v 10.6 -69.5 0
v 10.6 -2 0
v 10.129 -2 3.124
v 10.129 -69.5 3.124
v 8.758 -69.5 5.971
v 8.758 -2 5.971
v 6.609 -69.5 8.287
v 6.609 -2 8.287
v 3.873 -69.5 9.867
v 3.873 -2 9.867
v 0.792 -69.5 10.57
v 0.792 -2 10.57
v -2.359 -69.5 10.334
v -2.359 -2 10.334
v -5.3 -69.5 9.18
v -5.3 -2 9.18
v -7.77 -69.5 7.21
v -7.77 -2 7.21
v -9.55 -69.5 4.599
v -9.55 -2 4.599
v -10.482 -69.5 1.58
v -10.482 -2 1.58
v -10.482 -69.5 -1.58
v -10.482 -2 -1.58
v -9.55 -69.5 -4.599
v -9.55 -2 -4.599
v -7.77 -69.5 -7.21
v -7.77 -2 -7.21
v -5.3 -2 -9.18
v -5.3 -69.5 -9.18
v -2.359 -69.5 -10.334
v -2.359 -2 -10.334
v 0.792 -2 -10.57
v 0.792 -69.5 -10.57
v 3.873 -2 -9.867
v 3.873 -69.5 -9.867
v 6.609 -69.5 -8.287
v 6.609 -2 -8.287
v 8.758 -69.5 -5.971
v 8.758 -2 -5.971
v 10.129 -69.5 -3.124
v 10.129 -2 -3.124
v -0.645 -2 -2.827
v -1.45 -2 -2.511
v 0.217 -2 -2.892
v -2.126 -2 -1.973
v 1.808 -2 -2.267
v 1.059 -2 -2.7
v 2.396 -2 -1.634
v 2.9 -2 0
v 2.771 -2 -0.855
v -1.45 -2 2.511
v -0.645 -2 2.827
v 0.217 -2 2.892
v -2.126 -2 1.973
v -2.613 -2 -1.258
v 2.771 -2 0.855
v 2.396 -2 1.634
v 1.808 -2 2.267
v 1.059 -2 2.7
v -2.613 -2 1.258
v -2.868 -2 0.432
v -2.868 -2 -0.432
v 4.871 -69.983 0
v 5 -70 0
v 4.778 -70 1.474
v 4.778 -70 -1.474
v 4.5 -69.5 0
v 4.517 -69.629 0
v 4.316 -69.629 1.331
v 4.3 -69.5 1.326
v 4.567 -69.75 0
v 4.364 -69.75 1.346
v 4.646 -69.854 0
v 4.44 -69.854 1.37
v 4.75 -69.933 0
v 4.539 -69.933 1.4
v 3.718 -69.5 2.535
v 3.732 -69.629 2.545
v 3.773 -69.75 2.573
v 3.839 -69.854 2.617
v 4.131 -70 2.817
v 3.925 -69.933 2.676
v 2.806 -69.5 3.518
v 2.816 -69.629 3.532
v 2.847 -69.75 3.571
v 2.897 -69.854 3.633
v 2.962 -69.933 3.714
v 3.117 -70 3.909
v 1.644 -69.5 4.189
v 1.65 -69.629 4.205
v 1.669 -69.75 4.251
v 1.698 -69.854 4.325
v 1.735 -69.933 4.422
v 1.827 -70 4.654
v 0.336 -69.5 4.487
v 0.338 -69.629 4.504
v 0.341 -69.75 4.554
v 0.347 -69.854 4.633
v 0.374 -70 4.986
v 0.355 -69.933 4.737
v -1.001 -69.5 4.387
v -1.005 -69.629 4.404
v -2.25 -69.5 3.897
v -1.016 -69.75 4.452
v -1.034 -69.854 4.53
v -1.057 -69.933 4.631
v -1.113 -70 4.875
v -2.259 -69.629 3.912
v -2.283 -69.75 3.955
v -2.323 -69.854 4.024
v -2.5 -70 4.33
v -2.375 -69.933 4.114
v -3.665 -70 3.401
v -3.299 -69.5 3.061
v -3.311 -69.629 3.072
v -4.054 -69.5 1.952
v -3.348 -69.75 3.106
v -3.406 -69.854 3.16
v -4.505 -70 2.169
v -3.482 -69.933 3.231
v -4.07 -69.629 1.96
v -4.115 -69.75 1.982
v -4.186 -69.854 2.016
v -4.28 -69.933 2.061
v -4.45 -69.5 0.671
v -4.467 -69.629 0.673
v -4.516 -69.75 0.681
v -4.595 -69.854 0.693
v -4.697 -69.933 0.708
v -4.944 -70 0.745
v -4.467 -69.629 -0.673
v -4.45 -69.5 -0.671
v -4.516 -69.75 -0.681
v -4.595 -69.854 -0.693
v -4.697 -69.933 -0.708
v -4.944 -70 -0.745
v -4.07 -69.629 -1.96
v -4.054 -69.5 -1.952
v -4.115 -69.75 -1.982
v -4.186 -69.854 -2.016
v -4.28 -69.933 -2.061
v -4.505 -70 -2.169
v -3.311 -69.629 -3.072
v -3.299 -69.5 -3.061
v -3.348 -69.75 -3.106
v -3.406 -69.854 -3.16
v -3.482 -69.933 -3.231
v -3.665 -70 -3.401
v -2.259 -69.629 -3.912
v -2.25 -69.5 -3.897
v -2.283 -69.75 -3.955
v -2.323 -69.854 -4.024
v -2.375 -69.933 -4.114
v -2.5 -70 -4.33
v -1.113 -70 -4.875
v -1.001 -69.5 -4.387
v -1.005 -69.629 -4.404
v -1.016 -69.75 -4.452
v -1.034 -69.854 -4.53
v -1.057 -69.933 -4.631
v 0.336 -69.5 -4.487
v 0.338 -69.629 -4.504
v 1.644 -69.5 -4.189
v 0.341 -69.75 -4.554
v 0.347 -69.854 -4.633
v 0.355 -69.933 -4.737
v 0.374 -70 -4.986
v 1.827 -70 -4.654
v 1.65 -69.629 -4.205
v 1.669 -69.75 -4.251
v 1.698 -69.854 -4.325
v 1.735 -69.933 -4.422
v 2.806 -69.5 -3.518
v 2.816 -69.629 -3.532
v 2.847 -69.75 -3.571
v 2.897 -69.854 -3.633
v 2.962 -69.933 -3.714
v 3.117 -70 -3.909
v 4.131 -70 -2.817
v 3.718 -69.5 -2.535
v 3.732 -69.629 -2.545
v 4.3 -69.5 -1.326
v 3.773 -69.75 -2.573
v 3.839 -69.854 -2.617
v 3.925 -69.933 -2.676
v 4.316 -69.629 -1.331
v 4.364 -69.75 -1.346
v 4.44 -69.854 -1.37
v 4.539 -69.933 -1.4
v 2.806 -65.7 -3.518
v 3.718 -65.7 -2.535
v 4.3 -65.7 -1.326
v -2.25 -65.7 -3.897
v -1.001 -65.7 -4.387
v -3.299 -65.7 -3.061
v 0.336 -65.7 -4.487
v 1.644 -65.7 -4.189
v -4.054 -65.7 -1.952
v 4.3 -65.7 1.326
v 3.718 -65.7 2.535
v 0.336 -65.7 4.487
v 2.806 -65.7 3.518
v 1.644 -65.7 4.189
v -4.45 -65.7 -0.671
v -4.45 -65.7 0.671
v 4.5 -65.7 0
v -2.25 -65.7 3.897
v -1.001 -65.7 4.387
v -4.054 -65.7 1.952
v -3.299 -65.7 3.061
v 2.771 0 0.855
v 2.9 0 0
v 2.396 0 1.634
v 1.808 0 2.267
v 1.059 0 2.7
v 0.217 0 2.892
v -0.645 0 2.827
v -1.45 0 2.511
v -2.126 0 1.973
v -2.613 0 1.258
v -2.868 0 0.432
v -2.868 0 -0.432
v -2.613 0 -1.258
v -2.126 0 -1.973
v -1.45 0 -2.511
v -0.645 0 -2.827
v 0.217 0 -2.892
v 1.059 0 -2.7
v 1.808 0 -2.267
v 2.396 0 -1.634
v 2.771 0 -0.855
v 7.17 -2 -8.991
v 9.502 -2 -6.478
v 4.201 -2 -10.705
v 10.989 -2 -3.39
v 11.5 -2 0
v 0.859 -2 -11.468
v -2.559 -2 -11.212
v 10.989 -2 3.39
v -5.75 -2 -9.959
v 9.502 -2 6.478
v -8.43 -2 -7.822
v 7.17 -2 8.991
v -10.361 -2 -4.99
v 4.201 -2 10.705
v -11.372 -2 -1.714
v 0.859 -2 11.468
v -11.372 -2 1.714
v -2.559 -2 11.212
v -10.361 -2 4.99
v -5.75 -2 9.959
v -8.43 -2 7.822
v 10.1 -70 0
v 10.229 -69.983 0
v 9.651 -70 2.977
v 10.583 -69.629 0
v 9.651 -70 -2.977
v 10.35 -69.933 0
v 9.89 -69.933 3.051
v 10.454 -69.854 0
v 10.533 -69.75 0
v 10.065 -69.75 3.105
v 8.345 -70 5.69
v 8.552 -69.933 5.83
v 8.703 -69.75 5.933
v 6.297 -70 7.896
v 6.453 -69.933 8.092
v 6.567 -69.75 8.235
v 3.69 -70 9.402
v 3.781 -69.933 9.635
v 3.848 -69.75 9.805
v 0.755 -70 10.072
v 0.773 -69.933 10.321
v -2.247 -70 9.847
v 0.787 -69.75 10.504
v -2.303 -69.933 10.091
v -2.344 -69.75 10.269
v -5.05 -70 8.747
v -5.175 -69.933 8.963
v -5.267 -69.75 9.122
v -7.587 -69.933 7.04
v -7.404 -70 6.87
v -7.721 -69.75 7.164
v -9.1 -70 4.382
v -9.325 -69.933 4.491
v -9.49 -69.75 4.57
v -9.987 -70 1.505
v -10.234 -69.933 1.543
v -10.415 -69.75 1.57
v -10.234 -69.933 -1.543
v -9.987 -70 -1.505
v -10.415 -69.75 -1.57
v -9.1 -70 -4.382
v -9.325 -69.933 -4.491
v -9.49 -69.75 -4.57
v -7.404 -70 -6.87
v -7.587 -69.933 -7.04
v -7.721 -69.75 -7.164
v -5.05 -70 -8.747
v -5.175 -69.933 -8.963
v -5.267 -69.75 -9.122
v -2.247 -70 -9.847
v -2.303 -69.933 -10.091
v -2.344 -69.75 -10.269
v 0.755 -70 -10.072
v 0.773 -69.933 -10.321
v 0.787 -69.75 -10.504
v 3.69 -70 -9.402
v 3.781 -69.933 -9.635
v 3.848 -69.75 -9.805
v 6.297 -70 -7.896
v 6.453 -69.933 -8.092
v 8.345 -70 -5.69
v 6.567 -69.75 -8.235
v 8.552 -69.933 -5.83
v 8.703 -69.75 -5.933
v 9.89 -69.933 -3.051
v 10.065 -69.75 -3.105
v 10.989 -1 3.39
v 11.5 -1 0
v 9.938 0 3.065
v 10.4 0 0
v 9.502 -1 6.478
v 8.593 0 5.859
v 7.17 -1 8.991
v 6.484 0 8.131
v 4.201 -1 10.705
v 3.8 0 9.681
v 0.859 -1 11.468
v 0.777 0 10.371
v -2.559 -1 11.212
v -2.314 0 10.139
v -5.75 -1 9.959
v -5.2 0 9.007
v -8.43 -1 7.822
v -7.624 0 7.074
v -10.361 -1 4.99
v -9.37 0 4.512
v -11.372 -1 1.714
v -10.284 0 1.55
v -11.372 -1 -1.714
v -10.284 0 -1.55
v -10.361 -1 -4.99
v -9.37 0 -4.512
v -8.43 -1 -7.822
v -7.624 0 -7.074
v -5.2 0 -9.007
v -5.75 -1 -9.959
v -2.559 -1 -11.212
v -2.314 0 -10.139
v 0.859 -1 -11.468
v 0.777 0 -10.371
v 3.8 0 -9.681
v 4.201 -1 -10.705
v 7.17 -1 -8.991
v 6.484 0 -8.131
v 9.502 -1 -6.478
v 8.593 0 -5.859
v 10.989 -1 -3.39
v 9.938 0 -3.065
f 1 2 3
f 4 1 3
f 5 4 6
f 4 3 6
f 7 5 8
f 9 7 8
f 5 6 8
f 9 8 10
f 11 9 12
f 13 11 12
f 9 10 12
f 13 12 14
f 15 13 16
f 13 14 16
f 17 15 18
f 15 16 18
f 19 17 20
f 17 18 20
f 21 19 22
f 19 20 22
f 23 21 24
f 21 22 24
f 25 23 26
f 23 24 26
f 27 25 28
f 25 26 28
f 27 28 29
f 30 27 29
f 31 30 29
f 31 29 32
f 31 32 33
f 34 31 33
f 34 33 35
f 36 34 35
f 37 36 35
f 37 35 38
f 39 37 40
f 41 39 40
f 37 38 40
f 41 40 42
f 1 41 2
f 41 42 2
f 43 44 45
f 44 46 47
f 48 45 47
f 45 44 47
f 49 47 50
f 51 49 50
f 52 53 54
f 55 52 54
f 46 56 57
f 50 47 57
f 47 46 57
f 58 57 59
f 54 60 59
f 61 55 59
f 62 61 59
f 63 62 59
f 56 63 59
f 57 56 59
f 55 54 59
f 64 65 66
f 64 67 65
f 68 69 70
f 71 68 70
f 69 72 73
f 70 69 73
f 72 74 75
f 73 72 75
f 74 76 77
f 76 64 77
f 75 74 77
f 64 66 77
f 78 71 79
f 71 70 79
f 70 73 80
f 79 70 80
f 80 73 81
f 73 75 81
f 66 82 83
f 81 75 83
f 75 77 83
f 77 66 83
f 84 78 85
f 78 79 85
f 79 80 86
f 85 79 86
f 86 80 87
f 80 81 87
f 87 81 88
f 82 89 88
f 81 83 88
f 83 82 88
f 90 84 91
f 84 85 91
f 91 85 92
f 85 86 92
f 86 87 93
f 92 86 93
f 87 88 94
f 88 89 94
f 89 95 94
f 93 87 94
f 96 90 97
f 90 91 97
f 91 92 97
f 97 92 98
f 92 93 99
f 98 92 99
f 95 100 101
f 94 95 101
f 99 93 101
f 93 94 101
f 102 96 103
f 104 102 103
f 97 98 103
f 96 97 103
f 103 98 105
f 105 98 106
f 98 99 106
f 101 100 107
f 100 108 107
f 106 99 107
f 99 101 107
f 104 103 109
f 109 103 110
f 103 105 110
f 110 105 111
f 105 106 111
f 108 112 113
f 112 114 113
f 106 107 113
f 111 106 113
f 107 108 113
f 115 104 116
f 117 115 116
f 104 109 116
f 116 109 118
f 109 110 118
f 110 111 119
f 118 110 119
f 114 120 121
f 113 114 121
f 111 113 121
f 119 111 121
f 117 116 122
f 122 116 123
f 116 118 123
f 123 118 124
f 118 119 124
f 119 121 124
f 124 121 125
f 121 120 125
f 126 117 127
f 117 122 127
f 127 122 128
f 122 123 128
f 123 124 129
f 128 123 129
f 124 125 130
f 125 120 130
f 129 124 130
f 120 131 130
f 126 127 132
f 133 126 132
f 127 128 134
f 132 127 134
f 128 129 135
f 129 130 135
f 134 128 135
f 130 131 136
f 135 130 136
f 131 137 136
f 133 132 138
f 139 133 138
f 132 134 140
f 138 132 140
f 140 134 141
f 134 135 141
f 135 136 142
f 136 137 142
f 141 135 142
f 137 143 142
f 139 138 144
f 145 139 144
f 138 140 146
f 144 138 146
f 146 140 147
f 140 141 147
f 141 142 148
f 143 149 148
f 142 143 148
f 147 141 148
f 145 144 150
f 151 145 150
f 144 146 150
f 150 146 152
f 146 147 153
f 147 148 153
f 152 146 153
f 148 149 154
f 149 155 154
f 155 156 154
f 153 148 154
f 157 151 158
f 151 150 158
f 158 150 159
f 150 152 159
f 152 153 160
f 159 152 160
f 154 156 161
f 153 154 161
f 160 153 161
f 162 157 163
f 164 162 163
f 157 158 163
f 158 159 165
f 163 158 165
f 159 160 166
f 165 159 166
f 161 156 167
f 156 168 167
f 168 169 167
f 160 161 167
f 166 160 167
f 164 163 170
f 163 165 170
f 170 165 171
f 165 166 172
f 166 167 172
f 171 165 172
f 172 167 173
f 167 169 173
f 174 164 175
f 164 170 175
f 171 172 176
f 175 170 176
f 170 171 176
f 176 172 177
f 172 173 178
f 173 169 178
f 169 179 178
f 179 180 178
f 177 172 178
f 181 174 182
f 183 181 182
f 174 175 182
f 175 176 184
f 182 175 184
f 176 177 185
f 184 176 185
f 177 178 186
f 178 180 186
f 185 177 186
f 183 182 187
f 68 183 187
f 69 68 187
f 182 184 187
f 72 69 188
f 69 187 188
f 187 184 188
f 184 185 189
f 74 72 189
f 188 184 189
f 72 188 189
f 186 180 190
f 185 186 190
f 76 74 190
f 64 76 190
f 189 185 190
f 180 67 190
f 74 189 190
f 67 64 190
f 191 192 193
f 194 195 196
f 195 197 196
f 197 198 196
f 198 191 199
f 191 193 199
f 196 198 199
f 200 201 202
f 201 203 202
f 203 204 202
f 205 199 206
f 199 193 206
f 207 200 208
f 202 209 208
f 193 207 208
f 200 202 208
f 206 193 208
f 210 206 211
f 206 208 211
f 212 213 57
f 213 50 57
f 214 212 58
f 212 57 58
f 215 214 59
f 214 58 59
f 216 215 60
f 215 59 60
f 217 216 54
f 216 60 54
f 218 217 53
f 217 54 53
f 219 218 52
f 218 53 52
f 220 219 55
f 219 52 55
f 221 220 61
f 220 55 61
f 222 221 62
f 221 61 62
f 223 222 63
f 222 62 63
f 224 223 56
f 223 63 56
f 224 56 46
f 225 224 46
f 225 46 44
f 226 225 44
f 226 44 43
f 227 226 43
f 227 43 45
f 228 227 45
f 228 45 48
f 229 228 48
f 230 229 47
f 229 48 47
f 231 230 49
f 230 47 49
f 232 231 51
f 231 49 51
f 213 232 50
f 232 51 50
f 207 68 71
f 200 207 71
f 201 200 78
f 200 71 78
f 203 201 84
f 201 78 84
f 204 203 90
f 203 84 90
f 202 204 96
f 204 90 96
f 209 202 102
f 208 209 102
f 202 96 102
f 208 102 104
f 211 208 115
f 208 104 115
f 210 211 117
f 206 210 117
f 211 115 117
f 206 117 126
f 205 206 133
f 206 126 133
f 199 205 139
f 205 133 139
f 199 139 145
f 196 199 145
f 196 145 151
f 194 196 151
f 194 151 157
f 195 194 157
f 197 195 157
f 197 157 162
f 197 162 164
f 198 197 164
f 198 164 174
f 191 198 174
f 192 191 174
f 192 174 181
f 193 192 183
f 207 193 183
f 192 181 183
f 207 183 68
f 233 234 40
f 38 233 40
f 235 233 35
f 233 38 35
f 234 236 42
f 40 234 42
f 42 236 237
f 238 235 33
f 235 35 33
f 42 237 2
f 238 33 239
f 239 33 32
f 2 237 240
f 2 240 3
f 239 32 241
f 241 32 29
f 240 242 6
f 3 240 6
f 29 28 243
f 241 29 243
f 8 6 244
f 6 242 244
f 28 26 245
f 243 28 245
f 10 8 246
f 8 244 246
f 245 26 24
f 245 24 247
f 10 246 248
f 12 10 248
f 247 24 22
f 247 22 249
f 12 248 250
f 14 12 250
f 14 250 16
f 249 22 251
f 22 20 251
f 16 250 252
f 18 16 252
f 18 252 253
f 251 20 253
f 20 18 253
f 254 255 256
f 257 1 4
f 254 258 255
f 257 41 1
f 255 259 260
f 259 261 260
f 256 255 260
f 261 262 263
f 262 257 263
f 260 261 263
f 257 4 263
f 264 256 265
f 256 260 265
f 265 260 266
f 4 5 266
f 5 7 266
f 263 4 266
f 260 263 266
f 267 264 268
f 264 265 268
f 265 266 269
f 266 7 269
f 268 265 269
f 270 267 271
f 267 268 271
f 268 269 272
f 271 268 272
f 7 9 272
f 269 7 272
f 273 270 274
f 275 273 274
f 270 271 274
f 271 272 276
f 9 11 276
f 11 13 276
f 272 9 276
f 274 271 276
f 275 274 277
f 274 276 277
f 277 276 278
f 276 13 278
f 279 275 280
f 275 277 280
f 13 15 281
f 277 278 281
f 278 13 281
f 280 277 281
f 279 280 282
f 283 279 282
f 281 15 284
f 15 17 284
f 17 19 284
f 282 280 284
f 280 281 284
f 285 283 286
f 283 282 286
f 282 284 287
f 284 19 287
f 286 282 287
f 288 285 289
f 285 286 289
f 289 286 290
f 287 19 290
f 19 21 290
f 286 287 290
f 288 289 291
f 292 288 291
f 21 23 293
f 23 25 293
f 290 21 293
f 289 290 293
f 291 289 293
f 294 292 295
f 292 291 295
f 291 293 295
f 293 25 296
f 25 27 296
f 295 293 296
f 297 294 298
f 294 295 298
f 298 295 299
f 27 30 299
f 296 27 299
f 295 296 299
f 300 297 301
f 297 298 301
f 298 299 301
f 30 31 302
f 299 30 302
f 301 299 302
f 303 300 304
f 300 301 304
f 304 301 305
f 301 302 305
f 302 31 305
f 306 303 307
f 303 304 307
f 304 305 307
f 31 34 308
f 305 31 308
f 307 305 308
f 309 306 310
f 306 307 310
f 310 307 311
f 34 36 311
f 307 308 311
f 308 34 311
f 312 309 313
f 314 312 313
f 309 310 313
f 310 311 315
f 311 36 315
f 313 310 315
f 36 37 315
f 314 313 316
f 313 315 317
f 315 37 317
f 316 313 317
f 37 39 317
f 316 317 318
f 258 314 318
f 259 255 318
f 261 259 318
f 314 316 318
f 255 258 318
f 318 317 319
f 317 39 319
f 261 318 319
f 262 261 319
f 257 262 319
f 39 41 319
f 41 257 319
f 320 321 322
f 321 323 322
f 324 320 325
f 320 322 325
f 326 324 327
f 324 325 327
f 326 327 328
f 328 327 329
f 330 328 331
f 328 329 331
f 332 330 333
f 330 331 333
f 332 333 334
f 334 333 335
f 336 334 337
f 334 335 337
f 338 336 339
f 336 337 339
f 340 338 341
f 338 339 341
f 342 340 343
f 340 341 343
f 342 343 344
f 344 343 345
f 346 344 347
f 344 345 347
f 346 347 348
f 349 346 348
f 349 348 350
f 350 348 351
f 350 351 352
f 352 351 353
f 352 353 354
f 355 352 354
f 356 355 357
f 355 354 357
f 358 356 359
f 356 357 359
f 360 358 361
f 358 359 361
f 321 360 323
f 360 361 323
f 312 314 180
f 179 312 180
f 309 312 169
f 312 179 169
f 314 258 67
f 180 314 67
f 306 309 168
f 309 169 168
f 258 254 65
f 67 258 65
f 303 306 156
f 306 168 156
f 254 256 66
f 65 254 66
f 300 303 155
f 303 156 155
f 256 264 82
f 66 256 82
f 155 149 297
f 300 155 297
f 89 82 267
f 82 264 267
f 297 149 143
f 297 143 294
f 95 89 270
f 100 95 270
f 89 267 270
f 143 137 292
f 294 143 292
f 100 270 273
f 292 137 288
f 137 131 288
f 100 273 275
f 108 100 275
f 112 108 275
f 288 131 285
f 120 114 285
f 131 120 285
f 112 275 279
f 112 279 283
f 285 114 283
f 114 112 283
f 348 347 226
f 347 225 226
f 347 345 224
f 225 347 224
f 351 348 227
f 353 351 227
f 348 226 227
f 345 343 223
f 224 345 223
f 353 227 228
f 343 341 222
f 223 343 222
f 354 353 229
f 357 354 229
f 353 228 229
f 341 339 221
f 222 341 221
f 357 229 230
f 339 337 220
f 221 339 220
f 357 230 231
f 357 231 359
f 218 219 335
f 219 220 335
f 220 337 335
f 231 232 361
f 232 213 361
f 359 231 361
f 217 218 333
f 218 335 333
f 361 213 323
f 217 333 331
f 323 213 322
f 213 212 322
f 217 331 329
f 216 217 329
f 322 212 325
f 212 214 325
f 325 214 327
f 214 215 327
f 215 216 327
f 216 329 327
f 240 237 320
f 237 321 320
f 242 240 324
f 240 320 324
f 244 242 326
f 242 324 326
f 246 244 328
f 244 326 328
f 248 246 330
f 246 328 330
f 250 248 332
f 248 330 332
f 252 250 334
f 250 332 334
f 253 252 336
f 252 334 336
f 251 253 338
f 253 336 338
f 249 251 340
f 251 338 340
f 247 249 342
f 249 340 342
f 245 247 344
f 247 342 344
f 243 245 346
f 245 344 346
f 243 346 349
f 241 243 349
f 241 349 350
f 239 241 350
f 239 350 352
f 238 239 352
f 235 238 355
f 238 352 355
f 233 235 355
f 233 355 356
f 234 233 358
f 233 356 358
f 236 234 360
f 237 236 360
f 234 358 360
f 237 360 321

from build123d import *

# Parameters (mm, degrees)
F2_R = 0.5


with BuildPart() as f1:
    # F0 (on Top) → F1 (revolve)
    with BuildSketch(Plane.XY):
        Polygon((2.9, -2), (0, -2), (0, -65.7), (4.5, -65.7), (4.5, -70), (10.6, -70), (10.6, -2), (11.5, -2), (11.5, -1), (10.4, 0), (2.9, 0), align=None)
    revolve(axis=Axis((0, -33.85, 0), (0, -1, 0)))

    # F2
    f2_edges = [f1.edges().sort_by_distance(p)[0] for p in [
        (-10.6, -70, 0),
        (-4.5, -70, 0),
    ]]
    fillet(f2_edges, radius=F2_R)


solid = f1.part
